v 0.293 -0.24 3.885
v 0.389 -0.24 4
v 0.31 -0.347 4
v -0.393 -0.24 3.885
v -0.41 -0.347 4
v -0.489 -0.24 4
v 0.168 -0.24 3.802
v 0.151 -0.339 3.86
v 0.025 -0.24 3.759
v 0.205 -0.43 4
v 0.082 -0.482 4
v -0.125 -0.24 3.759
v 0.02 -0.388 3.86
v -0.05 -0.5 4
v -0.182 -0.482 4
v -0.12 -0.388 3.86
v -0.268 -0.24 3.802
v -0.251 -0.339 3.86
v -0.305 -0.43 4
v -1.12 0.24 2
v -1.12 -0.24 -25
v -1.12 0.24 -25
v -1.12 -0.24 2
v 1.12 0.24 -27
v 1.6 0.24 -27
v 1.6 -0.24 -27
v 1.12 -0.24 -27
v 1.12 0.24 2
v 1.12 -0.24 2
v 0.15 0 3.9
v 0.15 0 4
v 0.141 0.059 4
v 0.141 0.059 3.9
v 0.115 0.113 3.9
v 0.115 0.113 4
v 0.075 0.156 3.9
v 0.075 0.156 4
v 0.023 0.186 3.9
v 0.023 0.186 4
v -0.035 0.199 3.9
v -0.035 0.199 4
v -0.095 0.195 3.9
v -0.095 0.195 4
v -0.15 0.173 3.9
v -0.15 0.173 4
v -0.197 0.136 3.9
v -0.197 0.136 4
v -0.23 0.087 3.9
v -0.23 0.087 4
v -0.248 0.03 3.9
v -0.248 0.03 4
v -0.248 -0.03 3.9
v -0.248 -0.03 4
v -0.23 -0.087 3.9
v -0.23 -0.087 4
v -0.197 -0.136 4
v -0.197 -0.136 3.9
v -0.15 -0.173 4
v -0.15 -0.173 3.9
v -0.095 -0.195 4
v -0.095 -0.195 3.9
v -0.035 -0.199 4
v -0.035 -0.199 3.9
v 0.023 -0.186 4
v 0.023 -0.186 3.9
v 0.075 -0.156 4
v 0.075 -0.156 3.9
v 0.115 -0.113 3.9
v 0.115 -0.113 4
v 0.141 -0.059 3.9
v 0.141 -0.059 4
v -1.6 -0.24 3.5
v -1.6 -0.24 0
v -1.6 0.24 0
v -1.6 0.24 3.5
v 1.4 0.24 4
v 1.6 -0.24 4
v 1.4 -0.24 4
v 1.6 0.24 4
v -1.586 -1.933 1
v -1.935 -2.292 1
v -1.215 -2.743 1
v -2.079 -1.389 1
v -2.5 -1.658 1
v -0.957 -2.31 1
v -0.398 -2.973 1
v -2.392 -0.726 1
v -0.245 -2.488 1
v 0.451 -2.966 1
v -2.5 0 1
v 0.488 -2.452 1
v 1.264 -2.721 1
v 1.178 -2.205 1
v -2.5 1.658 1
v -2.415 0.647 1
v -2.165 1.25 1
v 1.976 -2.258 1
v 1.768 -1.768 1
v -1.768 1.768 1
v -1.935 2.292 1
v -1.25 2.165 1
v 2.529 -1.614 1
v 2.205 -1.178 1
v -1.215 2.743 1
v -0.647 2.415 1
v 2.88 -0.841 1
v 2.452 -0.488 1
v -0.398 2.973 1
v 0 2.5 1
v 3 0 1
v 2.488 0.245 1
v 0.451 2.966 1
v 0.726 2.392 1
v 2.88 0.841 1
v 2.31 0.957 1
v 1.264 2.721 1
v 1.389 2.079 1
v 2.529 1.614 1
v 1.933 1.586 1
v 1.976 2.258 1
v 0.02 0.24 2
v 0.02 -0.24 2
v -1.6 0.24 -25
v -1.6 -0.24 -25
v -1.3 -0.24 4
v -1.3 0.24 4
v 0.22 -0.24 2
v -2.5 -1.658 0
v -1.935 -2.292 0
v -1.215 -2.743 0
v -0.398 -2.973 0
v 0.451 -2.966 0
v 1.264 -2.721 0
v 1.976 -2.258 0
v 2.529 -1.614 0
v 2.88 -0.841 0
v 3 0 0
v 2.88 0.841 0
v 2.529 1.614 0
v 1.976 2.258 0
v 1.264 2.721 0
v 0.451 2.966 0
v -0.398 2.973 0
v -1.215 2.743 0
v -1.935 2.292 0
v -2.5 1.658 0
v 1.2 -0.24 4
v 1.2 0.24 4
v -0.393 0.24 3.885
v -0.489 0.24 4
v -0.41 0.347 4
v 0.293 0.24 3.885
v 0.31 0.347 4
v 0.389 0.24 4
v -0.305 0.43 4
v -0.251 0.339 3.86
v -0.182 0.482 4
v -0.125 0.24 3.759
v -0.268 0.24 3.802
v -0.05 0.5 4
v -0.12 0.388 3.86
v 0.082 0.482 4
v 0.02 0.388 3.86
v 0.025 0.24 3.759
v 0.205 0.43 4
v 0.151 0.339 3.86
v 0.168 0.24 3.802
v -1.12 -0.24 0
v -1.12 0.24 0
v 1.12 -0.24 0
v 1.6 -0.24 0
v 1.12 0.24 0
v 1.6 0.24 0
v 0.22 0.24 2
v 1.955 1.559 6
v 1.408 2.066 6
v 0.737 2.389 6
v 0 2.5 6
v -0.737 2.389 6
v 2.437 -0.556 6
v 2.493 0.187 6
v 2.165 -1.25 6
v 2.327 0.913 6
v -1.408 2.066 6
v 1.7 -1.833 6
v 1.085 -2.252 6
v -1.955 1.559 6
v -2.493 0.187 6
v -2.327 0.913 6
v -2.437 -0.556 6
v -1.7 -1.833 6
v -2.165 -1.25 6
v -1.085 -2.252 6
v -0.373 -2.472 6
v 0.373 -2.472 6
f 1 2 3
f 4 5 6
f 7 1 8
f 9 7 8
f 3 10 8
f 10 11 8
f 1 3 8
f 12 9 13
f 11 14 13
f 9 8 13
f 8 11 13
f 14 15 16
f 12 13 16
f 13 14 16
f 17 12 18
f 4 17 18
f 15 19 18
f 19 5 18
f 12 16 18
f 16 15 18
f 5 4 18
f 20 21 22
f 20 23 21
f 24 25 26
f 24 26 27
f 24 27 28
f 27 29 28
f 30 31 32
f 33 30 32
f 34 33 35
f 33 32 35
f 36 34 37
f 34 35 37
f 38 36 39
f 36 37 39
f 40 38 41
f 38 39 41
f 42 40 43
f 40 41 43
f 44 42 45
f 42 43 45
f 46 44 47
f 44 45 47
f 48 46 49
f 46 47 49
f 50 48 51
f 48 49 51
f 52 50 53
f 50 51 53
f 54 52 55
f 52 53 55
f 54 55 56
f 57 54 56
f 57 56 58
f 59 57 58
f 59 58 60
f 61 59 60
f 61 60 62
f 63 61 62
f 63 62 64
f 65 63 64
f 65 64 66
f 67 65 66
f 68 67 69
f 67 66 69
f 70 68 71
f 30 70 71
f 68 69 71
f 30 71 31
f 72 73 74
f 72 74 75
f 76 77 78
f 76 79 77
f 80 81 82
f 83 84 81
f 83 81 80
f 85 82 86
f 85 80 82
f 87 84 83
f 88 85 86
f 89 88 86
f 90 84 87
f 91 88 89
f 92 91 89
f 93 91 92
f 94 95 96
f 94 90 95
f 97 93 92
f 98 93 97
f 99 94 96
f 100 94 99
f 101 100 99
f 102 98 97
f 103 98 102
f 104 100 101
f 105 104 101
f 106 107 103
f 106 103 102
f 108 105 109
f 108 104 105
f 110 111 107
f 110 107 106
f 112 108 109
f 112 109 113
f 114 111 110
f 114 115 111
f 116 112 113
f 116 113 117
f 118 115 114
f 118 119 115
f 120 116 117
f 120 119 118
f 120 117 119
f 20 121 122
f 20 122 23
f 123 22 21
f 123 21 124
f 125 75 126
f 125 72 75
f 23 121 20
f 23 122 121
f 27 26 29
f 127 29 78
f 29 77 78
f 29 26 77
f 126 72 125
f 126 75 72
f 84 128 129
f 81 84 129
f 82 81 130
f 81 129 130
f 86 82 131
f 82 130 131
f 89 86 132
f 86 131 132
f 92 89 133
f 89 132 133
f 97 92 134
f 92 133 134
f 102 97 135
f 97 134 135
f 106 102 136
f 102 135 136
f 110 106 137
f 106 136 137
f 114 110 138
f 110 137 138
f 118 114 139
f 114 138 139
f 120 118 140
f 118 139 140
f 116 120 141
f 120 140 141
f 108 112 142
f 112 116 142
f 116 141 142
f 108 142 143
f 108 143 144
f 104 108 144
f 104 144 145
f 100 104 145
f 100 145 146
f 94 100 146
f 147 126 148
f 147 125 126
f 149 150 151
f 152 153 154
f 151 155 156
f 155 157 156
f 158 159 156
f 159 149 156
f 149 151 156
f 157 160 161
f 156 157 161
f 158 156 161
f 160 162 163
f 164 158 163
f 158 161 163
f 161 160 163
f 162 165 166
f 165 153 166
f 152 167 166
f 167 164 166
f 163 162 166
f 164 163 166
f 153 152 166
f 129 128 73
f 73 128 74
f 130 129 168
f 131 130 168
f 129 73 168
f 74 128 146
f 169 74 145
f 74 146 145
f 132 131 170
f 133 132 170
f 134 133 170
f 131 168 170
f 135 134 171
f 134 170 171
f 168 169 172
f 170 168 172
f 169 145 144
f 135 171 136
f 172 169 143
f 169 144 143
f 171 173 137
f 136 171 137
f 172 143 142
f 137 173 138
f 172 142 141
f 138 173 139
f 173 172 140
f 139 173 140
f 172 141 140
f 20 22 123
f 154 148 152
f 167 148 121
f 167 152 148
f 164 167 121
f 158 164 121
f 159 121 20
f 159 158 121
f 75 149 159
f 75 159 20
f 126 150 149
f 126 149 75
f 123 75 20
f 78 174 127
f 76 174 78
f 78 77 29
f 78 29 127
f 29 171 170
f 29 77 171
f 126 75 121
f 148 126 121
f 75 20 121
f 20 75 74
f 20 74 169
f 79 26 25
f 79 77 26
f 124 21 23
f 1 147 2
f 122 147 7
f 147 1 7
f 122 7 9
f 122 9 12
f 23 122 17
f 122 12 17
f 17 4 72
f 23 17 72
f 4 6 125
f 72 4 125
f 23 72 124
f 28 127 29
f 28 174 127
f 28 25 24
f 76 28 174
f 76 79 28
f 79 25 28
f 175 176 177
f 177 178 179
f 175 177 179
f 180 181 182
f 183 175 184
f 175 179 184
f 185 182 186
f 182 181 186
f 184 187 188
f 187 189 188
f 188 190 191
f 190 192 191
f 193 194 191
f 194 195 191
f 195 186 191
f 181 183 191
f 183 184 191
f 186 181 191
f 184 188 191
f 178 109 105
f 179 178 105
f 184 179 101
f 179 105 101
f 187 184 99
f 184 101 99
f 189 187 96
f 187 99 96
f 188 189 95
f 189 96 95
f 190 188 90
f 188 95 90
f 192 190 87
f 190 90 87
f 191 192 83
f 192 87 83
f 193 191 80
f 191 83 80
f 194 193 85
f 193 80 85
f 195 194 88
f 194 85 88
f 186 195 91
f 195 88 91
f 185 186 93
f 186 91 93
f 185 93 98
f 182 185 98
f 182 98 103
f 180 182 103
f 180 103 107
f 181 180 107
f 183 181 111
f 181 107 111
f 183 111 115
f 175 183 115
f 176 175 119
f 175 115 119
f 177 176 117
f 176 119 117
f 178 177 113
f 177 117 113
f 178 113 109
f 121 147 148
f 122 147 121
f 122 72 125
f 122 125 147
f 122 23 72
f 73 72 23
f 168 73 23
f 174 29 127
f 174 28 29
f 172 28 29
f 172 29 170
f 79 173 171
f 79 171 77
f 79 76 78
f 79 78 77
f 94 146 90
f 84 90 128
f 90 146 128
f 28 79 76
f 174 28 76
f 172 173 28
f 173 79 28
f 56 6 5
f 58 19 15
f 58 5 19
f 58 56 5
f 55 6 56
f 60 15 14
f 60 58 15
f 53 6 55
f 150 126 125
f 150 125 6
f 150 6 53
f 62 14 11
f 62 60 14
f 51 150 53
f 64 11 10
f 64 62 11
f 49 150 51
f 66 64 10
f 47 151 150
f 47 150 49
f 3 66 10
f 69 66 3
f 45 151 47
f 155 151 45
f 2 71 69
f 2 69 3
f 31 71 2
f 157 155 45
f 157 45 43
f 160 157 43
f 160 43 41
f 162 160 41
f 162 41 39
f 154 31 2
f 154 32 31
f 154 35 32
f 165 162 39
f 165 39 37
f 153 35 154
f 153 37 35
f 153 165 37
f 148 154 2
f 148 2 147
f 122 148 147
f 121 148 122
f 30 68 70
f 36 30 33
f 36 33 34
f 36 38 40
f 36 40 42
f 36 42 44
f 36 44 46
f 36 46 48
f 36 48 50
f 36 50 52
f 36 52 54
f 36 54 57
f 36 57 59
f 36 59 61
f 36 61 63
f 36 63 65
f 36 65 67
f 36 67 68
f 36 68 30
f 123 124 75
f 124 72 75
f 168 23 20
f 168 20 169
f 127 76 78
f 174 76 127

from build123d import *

# Parameters (mm, degrees)
ESBO_O1_R                  = 3
RESSALTO_EXTRUS_O1_DEPTH   = 1
ESBO_O3_W                  = 5
ESBO_O3_H                  = 2.5
CORTE_EXTRUS_O1_DEPTH      = 1
ESBO_O5_W                  = 0.48
ESBO_O5_H                  = 0.48
RESSALTO_EXTRUS_O2_DEPTH   = 25
RESSALTO_EXTRUS_O2_2_DEPTH = 25
ESBO_O6_W                  = 0.48
ESBO_O6_H                  = 0.48
RESSALTO_EXTRUS_O3_DEPTH   = 2
CORTE_EXTRUS_O2_DEPTH      = 0.24
RESSALTO_EXTRUS_O4_DEPTH   = 0.24
RESSALTO_EXTRUS_O4_2_DEPTH = 0.24
ESBO_O12_R                 = 0.2
CORTE_EXTRUS_O3_DEPTH      = 0.1


with BuildPart() as part:
    # Esboço1 → Ressalto-extrusão1 (new body)
    with BuildSketch(Plane.XY):
        Circle(ESBO_O1_R)
    extrude(amount=RESSALTO_EXTRUS_O1_DEPTH)

    # Esboço3 → Revolução1 (revolve)
    with BuildSketch(Plane(origin=(0, 0, 0), x_dir=(0, 0, -1), z_dir=(1, 0, 0))):
        with Locations((-3.5, 1.25)):
            Rectangle(ESBO_O3_W, ESBO_O3_H)
    revolve(axis=Axis((0, 0, 1), (0, 0, 1)))

    # Esboço4 → Corte-extrusão1 (cut)
    with BuildSketch(Plane(origin=(0, 0, 0), x_dir=(-1, 0, 0), z_dir=(0, 0, -1))):
        with BuildLine():
            Line((2.5, 1.658312395), (2.5, -1.658312395))
            ThreePointArc((2.5, -1.658312395), (3, 0), (2.5, 1.658312395))
        make_face()
    extrude(amount=-CORTE_EXTRUS_O1_DEPTH, mode=Mode.SUBTRACT)

    # Esboço7 → Corte-extrusão2 (cut, symmetric)
    with BuildSketch(Plane(origin=(0, 0, 0), x_dir=(1, 0, 0), z_dir=(0, 1, 0))):
        Polygon((-1.6, 0), (-1.6, -3.5), (-1.3, -4), (1.2, -4), (0.02, -2), (-1.12, -2), (-1.12, 0), align=None)
        Polygon((1.6, 0), (1.6, -4), (1.4, -4), (0.22, -2), (1.12, -2), (1.12, 0), align=None)
    extrude(amount=CORTE_EXTRUS_O2_DEPTH, both=True, mode=Mode.SUBTRACT)


with BuildPart() as body_2:
    # Esboço5 → Ressalto-extrusão2 (new body)
    with BuildSketch(Plane(origin=(0, 0, 0), x_dir=(-1, 0, 0), z_dir=(0, 0, -1))):
        with Locations((-1.36, 0)):
            Rectangle(ESBO_O5_W, ESBO_O5_H)
    extrude(amount=RESSALTO_EXTRUS_O2_DEPTH)


with BuildPart() as body_3:
    # Esboço5 → Ressalto-extrus_o2 2 (new body)
    with BuildSketch(Plane(origin=(0, 0, 0), x_dir=(-1, 0, 0), z_dir=(0, 0, -1))):
        with Locations((1.36, 0)):
            Rectangle(ESBO_O5_W, ESBO_O5_H)
    extrude(amount=RESSALTO_EXTRUS_O2_2_DEPTH)


with BuildPart() as body_4:
    # Esboço6 → Ressalto-extrusão3 (new body)
    with BuildSketch(Plane(origin=(0, 0, -25), x_dir=(-1, 0, 0), z_dir=(0, 0, -1))):
        with Locations((-1.36, 0)):
            Rectangle(ESBO_O6_W, ESBO_O6_H)
    extrude(amount=RESSALTO_EXTRUS_O3_DEPTH)


with BuildPart() as body_5:
    # Esboço8 → Ressalto-extrusão4 (new body, symmetric)
    with BuildSketch(Plane(origin=(0, 0, 0), x_dir=(1, 0, 0), z_dir=(0, 1, 0))):
        Polygon((-1.3, -4), (1.2, -4), (0.02, -2), (-1.12, -2), (-1.12, 0), (-1.6, 0), (-1.6, -3.5), align=None)
    extrude(amount=RESSALTO_EXTRUS_O4_DEPTH, both=True)

    # Combinar2: union body 3
    add(body_3.part)

    # Esboço10 → Corte-Revolução1 (revolve, cut)
    with BuildSketch(Plane(origin=(0, 0, 0), x_dir=(1, 0, 0), z_dir=(0, 1, 0))):
        with BuildLine():
            Line((-0.05, -4), (-0.05, -3.7))
            ThreePointArc((-0.05, -3.7), (-0.341547595, -3.780754009), (-0.55, -4))
            Line((-0.55, -4), (-0.05, -4))
        make_face()
    revolve(axis=Axis((-0.05, 0, 4), (0, 0, -1)), mode=Mode.SUBTRACT)


with BuildPart() as body_6:
    # Esboço8 → Ressalto-extrus_o4 2 (new body, symmetric)
    with BuildSketch(Plane(origin=(0, 0, 0), x_dir=(1, 0, 0), z_dir=(0, 1, 0))):
        Polygon((0.22, -2), (1.4, -4), (1.6, -4), (1.6, 0), (1.12, 0), (1.12, -2), align=None)
    extrude(amount=RESSALTO_EXTRUS_O4_2_DEPTH, both=True)

    # Combinar1: union body 4, body 2
    add(body_4.part)
    add(body_2.part)


with BuildPart() as body_4_2:
    # Esboço11 → Revolução2 (revolve)
    with BuildSketch(Plane(origin=(0, 0, 0), x_dir=(1, 0, 0), z_dir=(0, 1, 0))):
        with BuildLine():
            Line((-0.55, -4), (-0.05, -4))
            Line((-0.05, -4), (-0.05, -3.7))
            ThreePointArc((-0.05, -3.7), (-0.341547595, -3.780754009), (-0.55, -4))
        make_face()
    revolve(axis=Axis((-0.05, 0, 4), (0, 0, -1)))

    # Combinar3: union body 5
    add(body_5.part)

    # Esboço12 → Corte-extrusão3 (cut)
    with BuildSketch(Plane.XY.offset(4)):
        with Locations((-0.05, 0)):
            Circle(ESBO_O12_R)
    extrude(amount=-CORTE_EXTRUS_O3_DEPTH, mode=Mode.SUBTRACT)


solid = Compound([part.part, body_6.part, body_4_2.part])
